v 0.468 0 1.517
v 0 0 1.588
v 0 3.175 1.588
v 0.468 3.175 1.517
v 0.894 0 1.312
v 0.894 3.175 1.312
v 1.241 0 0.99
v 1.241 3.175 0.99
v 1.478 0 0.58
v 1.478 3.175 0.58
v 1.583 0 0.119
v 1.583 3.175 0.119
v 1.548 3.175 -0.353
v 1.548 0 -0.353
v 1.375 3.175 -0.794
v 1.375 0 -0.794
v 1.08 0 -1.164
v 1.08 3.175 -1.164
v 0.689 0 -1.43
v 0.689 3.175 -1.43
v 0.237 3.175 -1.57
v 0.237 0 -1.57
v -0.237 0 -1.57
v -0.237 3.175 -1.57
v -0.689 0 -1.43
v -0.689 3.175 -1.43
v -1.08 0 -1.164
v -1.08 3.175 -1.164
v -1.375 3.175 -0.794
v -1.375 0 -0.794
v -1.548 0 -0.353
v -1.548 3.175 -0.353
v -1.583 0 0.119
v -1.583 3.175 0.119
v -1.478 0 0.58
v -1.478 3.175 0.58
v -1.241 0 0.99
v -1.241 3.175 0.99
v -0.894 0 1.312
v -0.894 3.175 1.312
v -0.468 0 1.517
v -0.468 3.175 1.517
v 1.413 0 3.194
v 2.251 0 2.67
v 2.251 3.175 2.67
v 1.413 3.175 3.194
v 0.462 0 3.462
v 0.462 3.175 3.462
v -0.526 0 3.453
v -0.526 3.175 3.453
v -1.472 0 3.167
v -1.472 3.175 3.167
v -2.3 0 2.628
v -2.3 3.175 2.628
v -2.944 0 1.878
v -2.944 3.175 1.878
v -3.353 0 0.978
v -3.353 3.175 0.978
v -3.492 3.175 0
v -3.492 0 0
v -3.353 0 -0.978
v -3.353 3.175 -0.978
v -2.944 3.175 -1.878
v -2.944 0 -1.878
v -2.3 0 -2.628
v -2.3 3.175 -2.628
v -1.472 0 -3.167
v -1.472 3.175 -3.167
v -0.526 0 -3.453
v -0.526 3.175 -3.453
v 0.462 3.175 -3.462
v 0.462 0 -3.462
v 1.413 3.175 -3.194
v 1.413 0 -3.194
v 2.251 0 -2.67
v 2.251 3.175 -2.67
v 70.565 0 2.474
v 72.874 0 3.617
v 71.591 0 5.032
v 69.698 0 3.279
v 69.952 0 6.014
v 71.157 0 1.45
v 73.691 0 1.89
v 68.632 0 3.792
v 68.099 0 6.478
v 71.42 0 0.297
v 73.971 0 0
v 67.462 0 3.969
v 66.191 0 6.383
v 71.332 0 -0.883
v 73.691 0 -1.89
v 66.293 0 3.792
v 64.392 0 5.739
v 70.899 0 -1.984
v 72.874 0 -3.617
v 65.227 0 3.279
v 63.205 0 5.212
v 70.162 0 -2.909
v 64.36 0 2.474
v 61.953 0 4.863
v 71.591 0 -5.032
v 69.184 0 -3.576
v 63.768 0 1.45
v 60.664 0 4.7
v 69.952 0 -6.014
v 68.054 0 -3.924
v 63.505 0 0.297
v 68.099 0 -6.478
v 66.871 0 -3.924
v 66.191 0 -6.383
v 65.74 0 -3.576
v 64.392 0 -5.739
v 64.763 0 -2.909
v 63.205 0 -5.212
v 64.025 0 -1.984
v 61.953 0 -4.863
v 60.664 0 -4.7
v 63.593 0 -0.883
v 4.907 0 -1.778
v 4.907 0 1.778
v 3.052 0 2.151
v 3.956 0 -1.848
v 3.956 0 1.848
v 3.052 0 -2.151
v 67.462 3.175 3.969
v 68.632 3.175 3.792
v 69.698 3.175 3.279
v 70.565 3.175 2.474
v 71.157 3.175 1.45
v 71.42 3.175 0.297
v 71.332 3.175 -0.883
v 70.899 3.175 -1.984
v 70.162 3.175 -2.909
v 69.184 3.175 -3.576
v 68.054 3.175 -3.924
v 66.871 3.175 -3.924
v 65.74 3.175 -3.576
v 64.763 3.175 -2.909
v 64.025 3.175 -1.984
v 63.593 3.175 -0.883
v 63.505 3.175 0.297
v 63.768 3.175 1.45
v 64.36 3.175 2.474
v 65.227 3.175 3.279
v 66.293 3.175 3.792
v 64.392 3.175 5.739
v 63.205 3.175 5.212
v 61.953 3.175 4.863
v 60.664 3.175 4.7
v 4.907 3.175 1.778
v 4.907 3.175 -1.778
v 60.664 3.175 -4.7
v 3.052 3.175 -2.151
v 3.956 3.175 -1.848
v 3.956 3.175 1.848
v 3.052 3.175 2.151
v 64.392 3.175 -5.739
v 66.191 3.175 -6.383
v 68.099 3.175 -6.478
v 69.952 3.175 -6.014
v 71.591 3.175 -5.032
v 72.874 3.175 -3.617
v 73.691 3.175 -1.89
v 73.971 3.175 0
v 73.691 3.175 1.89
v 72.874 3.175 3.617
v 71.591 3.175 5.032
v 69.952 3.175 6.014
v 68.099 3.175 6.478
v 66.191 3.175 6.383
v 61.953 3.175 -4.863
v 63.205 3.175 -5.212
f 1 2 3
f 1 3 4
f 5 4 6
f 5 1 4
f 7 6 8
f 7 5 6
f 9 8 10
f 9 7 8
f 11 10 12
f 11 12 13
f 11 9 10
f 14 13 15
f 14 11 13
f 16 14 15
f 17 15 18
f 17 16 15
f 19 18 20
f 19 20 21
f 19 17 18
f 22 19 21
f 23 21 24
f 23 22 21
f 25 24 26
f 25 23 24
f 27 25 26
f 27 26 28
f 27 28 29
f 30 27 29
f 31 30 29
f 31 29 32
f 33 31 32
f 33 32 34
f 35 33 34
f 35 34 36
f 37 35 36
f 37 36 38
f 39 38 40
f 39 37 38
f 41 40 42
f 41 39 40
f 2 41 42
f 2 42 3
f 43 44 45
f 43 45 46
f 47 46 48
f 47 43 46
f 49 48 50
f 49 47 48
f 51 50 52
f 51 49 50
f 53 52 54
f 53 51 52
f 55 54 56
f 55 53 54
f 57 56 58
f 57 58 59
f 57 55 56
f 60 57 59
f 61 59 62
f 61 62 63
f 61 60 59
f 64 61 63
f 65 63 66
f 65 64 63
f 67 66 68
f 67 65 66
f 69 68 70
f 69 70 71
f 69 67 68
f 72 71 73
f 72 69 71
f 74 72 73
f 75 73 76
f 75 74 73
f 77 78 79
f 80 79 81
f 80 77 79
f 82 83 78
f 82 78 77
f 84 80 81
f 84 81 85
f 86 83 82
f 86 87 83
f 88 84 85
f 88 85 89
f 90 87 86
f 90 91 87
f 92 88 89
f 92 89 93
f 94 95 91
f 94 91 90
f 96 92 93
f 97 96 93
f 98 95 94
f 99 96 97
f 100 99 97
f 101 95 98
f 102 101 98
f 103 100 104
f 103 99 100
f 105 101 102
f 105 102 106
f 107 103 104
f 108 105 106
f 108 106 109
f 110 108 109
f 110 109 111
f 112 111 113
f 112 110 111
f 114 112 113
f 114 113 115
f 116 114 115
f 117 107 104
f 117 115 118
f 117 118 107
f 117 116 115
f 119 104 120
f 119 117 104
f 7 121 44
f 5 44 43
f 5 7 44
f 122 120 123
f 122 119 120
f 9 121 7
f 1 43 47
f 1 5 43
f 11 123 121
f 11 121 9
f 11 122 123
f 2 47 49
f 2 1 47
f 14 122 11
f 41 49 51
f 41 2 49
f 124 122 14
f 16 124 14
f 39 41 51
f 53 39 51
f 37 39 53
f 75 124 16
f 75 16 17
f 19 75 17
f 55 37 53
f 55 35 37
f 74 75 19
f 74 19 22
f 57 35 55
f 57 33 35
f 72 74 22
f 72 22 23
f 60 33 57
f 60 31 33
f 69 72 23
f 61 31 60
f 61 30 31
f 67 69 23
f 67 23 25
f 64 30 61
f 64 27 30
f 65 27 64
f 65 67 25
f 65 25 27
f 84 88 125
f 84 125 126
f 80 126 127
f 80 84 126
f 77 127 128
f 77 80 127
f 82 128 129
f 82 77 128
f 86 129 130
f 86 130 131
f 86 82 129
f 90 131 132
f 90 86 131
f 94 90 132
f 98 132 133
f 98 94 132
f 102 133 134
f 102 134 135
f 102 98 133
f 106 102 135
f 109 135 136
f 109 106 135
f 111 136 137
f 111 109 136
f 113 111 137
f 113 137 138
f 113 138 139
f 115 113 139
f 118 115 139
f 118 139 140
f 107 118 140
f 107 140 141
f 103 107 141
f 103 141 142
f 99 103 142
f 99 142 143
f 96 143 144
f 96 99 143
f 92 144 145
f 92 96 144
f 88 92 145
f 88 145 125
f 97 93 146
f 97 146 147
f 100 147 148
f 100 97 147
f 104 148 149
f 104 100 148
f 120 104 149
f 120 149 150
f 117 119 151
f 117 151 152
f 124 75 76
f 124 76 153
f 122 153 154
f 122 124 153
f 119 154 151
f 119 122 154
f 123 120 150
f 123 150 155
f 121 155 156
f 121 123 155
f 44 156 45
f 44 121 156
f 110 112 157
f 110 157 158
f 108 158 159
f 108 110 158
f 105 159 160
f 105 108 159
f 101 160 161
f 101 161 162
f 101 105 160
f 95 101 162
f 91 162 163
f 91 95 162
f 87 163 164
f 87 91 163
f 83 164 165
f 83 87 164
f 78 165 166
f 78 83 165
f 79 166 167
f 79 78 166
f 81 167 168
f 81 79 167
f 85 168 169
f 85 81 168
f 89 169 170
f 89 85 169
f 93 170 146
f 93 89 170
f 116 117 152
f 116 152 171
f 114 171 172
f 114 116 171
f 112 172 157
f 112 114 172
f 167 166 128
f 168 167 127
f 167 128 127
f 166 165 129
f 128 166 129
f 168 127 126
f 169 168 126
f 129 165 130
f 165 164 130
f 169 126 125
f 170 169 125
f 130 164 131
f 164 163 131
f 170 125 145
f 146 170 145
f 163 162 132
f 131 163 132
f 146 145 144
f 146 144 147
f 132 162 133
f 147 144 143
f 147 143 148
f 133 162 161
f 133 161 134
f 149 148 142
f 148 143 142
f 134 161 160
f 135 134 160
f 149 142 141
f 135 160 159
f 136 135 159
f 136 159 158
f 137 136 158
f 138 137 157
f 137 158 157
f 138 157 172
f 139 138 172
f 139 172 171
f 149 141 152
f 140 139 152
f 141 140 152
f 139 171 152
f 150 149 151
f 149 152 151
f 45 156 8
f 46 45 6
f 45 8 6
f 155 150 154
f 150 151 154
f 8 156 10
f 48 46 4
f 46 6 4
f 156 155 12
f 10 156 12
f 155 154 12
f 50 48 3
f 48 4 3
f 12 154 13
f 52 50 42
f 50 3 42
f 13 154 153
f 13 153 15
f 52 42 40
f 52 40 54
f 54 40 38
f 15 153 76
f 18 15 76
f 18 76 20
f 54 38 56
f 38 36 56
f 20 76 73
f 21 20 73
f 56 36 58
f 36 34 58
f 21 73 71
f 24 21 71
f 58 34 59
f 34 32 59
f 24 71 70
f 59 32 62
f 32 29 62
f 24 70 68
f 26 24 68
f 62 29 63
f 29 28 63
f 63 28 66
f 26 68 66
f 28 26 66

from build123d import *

# Parameters (mm, degrees)
SKETCH1_R           = 1.5875
SKETCH1_R_2         = 3.96875
BOSS_EXTRUDE1_DEPTH = 3.175


with BuildPart() as part:
    # Sketch1 → Boss-Extrude1 (new body)
    with BuildSketch(Plane(origin=(0, 0, 0), x_dir=(1, 0, 0), z_dir=(0, 1, 0))):
        with BuildLine():
            Line((4.906744273, 1.778), (60.663965564, 4.700112147))
            ThreePointArc((60.663965564, 4.700112147), (62.585298916, 5.014270589), (64.392175829, 5.739124507))
            ThreePointArc((64.392175829, 5.739124507), (73.97115, 0), (64.392175829, -5.739124507))
            ThreePointArc((64.392175829, -5.739124507), (62.585298916, -5.014270589), (60.663965564, -4.700112147))
            Line((60.663965564, -4.700112147), (4.906744273, -1.778))
            ThreePointArc((4.906744273, -1.778), (3.494086568, -1.971116067), (2.251338568, -2.670024513))
            ThreePointArc((2.251338568, -2.670024513), (-3.4925, 0), (2.251338568, 2.670024513))
            ThreePointArc((2.251338568, 2.670024513), (3.494086568, 1.971116067), (4.906744273, 1.778))
        make_face()
        with Locations(Location((0, 0, 0), (0, 0, 270))):
            Circle(SKETCH1_R, mode=Mode.SUBTRACT)
        with Locations(Location((67.4624, 0, 0), (0, 0, 270))):
            Circle(SKETCH1_R_2, mode=Mode.SUBTRACT)
    extrude(amount=BOSS_EXTRUDE1_DEPTH)


solid = part.part
